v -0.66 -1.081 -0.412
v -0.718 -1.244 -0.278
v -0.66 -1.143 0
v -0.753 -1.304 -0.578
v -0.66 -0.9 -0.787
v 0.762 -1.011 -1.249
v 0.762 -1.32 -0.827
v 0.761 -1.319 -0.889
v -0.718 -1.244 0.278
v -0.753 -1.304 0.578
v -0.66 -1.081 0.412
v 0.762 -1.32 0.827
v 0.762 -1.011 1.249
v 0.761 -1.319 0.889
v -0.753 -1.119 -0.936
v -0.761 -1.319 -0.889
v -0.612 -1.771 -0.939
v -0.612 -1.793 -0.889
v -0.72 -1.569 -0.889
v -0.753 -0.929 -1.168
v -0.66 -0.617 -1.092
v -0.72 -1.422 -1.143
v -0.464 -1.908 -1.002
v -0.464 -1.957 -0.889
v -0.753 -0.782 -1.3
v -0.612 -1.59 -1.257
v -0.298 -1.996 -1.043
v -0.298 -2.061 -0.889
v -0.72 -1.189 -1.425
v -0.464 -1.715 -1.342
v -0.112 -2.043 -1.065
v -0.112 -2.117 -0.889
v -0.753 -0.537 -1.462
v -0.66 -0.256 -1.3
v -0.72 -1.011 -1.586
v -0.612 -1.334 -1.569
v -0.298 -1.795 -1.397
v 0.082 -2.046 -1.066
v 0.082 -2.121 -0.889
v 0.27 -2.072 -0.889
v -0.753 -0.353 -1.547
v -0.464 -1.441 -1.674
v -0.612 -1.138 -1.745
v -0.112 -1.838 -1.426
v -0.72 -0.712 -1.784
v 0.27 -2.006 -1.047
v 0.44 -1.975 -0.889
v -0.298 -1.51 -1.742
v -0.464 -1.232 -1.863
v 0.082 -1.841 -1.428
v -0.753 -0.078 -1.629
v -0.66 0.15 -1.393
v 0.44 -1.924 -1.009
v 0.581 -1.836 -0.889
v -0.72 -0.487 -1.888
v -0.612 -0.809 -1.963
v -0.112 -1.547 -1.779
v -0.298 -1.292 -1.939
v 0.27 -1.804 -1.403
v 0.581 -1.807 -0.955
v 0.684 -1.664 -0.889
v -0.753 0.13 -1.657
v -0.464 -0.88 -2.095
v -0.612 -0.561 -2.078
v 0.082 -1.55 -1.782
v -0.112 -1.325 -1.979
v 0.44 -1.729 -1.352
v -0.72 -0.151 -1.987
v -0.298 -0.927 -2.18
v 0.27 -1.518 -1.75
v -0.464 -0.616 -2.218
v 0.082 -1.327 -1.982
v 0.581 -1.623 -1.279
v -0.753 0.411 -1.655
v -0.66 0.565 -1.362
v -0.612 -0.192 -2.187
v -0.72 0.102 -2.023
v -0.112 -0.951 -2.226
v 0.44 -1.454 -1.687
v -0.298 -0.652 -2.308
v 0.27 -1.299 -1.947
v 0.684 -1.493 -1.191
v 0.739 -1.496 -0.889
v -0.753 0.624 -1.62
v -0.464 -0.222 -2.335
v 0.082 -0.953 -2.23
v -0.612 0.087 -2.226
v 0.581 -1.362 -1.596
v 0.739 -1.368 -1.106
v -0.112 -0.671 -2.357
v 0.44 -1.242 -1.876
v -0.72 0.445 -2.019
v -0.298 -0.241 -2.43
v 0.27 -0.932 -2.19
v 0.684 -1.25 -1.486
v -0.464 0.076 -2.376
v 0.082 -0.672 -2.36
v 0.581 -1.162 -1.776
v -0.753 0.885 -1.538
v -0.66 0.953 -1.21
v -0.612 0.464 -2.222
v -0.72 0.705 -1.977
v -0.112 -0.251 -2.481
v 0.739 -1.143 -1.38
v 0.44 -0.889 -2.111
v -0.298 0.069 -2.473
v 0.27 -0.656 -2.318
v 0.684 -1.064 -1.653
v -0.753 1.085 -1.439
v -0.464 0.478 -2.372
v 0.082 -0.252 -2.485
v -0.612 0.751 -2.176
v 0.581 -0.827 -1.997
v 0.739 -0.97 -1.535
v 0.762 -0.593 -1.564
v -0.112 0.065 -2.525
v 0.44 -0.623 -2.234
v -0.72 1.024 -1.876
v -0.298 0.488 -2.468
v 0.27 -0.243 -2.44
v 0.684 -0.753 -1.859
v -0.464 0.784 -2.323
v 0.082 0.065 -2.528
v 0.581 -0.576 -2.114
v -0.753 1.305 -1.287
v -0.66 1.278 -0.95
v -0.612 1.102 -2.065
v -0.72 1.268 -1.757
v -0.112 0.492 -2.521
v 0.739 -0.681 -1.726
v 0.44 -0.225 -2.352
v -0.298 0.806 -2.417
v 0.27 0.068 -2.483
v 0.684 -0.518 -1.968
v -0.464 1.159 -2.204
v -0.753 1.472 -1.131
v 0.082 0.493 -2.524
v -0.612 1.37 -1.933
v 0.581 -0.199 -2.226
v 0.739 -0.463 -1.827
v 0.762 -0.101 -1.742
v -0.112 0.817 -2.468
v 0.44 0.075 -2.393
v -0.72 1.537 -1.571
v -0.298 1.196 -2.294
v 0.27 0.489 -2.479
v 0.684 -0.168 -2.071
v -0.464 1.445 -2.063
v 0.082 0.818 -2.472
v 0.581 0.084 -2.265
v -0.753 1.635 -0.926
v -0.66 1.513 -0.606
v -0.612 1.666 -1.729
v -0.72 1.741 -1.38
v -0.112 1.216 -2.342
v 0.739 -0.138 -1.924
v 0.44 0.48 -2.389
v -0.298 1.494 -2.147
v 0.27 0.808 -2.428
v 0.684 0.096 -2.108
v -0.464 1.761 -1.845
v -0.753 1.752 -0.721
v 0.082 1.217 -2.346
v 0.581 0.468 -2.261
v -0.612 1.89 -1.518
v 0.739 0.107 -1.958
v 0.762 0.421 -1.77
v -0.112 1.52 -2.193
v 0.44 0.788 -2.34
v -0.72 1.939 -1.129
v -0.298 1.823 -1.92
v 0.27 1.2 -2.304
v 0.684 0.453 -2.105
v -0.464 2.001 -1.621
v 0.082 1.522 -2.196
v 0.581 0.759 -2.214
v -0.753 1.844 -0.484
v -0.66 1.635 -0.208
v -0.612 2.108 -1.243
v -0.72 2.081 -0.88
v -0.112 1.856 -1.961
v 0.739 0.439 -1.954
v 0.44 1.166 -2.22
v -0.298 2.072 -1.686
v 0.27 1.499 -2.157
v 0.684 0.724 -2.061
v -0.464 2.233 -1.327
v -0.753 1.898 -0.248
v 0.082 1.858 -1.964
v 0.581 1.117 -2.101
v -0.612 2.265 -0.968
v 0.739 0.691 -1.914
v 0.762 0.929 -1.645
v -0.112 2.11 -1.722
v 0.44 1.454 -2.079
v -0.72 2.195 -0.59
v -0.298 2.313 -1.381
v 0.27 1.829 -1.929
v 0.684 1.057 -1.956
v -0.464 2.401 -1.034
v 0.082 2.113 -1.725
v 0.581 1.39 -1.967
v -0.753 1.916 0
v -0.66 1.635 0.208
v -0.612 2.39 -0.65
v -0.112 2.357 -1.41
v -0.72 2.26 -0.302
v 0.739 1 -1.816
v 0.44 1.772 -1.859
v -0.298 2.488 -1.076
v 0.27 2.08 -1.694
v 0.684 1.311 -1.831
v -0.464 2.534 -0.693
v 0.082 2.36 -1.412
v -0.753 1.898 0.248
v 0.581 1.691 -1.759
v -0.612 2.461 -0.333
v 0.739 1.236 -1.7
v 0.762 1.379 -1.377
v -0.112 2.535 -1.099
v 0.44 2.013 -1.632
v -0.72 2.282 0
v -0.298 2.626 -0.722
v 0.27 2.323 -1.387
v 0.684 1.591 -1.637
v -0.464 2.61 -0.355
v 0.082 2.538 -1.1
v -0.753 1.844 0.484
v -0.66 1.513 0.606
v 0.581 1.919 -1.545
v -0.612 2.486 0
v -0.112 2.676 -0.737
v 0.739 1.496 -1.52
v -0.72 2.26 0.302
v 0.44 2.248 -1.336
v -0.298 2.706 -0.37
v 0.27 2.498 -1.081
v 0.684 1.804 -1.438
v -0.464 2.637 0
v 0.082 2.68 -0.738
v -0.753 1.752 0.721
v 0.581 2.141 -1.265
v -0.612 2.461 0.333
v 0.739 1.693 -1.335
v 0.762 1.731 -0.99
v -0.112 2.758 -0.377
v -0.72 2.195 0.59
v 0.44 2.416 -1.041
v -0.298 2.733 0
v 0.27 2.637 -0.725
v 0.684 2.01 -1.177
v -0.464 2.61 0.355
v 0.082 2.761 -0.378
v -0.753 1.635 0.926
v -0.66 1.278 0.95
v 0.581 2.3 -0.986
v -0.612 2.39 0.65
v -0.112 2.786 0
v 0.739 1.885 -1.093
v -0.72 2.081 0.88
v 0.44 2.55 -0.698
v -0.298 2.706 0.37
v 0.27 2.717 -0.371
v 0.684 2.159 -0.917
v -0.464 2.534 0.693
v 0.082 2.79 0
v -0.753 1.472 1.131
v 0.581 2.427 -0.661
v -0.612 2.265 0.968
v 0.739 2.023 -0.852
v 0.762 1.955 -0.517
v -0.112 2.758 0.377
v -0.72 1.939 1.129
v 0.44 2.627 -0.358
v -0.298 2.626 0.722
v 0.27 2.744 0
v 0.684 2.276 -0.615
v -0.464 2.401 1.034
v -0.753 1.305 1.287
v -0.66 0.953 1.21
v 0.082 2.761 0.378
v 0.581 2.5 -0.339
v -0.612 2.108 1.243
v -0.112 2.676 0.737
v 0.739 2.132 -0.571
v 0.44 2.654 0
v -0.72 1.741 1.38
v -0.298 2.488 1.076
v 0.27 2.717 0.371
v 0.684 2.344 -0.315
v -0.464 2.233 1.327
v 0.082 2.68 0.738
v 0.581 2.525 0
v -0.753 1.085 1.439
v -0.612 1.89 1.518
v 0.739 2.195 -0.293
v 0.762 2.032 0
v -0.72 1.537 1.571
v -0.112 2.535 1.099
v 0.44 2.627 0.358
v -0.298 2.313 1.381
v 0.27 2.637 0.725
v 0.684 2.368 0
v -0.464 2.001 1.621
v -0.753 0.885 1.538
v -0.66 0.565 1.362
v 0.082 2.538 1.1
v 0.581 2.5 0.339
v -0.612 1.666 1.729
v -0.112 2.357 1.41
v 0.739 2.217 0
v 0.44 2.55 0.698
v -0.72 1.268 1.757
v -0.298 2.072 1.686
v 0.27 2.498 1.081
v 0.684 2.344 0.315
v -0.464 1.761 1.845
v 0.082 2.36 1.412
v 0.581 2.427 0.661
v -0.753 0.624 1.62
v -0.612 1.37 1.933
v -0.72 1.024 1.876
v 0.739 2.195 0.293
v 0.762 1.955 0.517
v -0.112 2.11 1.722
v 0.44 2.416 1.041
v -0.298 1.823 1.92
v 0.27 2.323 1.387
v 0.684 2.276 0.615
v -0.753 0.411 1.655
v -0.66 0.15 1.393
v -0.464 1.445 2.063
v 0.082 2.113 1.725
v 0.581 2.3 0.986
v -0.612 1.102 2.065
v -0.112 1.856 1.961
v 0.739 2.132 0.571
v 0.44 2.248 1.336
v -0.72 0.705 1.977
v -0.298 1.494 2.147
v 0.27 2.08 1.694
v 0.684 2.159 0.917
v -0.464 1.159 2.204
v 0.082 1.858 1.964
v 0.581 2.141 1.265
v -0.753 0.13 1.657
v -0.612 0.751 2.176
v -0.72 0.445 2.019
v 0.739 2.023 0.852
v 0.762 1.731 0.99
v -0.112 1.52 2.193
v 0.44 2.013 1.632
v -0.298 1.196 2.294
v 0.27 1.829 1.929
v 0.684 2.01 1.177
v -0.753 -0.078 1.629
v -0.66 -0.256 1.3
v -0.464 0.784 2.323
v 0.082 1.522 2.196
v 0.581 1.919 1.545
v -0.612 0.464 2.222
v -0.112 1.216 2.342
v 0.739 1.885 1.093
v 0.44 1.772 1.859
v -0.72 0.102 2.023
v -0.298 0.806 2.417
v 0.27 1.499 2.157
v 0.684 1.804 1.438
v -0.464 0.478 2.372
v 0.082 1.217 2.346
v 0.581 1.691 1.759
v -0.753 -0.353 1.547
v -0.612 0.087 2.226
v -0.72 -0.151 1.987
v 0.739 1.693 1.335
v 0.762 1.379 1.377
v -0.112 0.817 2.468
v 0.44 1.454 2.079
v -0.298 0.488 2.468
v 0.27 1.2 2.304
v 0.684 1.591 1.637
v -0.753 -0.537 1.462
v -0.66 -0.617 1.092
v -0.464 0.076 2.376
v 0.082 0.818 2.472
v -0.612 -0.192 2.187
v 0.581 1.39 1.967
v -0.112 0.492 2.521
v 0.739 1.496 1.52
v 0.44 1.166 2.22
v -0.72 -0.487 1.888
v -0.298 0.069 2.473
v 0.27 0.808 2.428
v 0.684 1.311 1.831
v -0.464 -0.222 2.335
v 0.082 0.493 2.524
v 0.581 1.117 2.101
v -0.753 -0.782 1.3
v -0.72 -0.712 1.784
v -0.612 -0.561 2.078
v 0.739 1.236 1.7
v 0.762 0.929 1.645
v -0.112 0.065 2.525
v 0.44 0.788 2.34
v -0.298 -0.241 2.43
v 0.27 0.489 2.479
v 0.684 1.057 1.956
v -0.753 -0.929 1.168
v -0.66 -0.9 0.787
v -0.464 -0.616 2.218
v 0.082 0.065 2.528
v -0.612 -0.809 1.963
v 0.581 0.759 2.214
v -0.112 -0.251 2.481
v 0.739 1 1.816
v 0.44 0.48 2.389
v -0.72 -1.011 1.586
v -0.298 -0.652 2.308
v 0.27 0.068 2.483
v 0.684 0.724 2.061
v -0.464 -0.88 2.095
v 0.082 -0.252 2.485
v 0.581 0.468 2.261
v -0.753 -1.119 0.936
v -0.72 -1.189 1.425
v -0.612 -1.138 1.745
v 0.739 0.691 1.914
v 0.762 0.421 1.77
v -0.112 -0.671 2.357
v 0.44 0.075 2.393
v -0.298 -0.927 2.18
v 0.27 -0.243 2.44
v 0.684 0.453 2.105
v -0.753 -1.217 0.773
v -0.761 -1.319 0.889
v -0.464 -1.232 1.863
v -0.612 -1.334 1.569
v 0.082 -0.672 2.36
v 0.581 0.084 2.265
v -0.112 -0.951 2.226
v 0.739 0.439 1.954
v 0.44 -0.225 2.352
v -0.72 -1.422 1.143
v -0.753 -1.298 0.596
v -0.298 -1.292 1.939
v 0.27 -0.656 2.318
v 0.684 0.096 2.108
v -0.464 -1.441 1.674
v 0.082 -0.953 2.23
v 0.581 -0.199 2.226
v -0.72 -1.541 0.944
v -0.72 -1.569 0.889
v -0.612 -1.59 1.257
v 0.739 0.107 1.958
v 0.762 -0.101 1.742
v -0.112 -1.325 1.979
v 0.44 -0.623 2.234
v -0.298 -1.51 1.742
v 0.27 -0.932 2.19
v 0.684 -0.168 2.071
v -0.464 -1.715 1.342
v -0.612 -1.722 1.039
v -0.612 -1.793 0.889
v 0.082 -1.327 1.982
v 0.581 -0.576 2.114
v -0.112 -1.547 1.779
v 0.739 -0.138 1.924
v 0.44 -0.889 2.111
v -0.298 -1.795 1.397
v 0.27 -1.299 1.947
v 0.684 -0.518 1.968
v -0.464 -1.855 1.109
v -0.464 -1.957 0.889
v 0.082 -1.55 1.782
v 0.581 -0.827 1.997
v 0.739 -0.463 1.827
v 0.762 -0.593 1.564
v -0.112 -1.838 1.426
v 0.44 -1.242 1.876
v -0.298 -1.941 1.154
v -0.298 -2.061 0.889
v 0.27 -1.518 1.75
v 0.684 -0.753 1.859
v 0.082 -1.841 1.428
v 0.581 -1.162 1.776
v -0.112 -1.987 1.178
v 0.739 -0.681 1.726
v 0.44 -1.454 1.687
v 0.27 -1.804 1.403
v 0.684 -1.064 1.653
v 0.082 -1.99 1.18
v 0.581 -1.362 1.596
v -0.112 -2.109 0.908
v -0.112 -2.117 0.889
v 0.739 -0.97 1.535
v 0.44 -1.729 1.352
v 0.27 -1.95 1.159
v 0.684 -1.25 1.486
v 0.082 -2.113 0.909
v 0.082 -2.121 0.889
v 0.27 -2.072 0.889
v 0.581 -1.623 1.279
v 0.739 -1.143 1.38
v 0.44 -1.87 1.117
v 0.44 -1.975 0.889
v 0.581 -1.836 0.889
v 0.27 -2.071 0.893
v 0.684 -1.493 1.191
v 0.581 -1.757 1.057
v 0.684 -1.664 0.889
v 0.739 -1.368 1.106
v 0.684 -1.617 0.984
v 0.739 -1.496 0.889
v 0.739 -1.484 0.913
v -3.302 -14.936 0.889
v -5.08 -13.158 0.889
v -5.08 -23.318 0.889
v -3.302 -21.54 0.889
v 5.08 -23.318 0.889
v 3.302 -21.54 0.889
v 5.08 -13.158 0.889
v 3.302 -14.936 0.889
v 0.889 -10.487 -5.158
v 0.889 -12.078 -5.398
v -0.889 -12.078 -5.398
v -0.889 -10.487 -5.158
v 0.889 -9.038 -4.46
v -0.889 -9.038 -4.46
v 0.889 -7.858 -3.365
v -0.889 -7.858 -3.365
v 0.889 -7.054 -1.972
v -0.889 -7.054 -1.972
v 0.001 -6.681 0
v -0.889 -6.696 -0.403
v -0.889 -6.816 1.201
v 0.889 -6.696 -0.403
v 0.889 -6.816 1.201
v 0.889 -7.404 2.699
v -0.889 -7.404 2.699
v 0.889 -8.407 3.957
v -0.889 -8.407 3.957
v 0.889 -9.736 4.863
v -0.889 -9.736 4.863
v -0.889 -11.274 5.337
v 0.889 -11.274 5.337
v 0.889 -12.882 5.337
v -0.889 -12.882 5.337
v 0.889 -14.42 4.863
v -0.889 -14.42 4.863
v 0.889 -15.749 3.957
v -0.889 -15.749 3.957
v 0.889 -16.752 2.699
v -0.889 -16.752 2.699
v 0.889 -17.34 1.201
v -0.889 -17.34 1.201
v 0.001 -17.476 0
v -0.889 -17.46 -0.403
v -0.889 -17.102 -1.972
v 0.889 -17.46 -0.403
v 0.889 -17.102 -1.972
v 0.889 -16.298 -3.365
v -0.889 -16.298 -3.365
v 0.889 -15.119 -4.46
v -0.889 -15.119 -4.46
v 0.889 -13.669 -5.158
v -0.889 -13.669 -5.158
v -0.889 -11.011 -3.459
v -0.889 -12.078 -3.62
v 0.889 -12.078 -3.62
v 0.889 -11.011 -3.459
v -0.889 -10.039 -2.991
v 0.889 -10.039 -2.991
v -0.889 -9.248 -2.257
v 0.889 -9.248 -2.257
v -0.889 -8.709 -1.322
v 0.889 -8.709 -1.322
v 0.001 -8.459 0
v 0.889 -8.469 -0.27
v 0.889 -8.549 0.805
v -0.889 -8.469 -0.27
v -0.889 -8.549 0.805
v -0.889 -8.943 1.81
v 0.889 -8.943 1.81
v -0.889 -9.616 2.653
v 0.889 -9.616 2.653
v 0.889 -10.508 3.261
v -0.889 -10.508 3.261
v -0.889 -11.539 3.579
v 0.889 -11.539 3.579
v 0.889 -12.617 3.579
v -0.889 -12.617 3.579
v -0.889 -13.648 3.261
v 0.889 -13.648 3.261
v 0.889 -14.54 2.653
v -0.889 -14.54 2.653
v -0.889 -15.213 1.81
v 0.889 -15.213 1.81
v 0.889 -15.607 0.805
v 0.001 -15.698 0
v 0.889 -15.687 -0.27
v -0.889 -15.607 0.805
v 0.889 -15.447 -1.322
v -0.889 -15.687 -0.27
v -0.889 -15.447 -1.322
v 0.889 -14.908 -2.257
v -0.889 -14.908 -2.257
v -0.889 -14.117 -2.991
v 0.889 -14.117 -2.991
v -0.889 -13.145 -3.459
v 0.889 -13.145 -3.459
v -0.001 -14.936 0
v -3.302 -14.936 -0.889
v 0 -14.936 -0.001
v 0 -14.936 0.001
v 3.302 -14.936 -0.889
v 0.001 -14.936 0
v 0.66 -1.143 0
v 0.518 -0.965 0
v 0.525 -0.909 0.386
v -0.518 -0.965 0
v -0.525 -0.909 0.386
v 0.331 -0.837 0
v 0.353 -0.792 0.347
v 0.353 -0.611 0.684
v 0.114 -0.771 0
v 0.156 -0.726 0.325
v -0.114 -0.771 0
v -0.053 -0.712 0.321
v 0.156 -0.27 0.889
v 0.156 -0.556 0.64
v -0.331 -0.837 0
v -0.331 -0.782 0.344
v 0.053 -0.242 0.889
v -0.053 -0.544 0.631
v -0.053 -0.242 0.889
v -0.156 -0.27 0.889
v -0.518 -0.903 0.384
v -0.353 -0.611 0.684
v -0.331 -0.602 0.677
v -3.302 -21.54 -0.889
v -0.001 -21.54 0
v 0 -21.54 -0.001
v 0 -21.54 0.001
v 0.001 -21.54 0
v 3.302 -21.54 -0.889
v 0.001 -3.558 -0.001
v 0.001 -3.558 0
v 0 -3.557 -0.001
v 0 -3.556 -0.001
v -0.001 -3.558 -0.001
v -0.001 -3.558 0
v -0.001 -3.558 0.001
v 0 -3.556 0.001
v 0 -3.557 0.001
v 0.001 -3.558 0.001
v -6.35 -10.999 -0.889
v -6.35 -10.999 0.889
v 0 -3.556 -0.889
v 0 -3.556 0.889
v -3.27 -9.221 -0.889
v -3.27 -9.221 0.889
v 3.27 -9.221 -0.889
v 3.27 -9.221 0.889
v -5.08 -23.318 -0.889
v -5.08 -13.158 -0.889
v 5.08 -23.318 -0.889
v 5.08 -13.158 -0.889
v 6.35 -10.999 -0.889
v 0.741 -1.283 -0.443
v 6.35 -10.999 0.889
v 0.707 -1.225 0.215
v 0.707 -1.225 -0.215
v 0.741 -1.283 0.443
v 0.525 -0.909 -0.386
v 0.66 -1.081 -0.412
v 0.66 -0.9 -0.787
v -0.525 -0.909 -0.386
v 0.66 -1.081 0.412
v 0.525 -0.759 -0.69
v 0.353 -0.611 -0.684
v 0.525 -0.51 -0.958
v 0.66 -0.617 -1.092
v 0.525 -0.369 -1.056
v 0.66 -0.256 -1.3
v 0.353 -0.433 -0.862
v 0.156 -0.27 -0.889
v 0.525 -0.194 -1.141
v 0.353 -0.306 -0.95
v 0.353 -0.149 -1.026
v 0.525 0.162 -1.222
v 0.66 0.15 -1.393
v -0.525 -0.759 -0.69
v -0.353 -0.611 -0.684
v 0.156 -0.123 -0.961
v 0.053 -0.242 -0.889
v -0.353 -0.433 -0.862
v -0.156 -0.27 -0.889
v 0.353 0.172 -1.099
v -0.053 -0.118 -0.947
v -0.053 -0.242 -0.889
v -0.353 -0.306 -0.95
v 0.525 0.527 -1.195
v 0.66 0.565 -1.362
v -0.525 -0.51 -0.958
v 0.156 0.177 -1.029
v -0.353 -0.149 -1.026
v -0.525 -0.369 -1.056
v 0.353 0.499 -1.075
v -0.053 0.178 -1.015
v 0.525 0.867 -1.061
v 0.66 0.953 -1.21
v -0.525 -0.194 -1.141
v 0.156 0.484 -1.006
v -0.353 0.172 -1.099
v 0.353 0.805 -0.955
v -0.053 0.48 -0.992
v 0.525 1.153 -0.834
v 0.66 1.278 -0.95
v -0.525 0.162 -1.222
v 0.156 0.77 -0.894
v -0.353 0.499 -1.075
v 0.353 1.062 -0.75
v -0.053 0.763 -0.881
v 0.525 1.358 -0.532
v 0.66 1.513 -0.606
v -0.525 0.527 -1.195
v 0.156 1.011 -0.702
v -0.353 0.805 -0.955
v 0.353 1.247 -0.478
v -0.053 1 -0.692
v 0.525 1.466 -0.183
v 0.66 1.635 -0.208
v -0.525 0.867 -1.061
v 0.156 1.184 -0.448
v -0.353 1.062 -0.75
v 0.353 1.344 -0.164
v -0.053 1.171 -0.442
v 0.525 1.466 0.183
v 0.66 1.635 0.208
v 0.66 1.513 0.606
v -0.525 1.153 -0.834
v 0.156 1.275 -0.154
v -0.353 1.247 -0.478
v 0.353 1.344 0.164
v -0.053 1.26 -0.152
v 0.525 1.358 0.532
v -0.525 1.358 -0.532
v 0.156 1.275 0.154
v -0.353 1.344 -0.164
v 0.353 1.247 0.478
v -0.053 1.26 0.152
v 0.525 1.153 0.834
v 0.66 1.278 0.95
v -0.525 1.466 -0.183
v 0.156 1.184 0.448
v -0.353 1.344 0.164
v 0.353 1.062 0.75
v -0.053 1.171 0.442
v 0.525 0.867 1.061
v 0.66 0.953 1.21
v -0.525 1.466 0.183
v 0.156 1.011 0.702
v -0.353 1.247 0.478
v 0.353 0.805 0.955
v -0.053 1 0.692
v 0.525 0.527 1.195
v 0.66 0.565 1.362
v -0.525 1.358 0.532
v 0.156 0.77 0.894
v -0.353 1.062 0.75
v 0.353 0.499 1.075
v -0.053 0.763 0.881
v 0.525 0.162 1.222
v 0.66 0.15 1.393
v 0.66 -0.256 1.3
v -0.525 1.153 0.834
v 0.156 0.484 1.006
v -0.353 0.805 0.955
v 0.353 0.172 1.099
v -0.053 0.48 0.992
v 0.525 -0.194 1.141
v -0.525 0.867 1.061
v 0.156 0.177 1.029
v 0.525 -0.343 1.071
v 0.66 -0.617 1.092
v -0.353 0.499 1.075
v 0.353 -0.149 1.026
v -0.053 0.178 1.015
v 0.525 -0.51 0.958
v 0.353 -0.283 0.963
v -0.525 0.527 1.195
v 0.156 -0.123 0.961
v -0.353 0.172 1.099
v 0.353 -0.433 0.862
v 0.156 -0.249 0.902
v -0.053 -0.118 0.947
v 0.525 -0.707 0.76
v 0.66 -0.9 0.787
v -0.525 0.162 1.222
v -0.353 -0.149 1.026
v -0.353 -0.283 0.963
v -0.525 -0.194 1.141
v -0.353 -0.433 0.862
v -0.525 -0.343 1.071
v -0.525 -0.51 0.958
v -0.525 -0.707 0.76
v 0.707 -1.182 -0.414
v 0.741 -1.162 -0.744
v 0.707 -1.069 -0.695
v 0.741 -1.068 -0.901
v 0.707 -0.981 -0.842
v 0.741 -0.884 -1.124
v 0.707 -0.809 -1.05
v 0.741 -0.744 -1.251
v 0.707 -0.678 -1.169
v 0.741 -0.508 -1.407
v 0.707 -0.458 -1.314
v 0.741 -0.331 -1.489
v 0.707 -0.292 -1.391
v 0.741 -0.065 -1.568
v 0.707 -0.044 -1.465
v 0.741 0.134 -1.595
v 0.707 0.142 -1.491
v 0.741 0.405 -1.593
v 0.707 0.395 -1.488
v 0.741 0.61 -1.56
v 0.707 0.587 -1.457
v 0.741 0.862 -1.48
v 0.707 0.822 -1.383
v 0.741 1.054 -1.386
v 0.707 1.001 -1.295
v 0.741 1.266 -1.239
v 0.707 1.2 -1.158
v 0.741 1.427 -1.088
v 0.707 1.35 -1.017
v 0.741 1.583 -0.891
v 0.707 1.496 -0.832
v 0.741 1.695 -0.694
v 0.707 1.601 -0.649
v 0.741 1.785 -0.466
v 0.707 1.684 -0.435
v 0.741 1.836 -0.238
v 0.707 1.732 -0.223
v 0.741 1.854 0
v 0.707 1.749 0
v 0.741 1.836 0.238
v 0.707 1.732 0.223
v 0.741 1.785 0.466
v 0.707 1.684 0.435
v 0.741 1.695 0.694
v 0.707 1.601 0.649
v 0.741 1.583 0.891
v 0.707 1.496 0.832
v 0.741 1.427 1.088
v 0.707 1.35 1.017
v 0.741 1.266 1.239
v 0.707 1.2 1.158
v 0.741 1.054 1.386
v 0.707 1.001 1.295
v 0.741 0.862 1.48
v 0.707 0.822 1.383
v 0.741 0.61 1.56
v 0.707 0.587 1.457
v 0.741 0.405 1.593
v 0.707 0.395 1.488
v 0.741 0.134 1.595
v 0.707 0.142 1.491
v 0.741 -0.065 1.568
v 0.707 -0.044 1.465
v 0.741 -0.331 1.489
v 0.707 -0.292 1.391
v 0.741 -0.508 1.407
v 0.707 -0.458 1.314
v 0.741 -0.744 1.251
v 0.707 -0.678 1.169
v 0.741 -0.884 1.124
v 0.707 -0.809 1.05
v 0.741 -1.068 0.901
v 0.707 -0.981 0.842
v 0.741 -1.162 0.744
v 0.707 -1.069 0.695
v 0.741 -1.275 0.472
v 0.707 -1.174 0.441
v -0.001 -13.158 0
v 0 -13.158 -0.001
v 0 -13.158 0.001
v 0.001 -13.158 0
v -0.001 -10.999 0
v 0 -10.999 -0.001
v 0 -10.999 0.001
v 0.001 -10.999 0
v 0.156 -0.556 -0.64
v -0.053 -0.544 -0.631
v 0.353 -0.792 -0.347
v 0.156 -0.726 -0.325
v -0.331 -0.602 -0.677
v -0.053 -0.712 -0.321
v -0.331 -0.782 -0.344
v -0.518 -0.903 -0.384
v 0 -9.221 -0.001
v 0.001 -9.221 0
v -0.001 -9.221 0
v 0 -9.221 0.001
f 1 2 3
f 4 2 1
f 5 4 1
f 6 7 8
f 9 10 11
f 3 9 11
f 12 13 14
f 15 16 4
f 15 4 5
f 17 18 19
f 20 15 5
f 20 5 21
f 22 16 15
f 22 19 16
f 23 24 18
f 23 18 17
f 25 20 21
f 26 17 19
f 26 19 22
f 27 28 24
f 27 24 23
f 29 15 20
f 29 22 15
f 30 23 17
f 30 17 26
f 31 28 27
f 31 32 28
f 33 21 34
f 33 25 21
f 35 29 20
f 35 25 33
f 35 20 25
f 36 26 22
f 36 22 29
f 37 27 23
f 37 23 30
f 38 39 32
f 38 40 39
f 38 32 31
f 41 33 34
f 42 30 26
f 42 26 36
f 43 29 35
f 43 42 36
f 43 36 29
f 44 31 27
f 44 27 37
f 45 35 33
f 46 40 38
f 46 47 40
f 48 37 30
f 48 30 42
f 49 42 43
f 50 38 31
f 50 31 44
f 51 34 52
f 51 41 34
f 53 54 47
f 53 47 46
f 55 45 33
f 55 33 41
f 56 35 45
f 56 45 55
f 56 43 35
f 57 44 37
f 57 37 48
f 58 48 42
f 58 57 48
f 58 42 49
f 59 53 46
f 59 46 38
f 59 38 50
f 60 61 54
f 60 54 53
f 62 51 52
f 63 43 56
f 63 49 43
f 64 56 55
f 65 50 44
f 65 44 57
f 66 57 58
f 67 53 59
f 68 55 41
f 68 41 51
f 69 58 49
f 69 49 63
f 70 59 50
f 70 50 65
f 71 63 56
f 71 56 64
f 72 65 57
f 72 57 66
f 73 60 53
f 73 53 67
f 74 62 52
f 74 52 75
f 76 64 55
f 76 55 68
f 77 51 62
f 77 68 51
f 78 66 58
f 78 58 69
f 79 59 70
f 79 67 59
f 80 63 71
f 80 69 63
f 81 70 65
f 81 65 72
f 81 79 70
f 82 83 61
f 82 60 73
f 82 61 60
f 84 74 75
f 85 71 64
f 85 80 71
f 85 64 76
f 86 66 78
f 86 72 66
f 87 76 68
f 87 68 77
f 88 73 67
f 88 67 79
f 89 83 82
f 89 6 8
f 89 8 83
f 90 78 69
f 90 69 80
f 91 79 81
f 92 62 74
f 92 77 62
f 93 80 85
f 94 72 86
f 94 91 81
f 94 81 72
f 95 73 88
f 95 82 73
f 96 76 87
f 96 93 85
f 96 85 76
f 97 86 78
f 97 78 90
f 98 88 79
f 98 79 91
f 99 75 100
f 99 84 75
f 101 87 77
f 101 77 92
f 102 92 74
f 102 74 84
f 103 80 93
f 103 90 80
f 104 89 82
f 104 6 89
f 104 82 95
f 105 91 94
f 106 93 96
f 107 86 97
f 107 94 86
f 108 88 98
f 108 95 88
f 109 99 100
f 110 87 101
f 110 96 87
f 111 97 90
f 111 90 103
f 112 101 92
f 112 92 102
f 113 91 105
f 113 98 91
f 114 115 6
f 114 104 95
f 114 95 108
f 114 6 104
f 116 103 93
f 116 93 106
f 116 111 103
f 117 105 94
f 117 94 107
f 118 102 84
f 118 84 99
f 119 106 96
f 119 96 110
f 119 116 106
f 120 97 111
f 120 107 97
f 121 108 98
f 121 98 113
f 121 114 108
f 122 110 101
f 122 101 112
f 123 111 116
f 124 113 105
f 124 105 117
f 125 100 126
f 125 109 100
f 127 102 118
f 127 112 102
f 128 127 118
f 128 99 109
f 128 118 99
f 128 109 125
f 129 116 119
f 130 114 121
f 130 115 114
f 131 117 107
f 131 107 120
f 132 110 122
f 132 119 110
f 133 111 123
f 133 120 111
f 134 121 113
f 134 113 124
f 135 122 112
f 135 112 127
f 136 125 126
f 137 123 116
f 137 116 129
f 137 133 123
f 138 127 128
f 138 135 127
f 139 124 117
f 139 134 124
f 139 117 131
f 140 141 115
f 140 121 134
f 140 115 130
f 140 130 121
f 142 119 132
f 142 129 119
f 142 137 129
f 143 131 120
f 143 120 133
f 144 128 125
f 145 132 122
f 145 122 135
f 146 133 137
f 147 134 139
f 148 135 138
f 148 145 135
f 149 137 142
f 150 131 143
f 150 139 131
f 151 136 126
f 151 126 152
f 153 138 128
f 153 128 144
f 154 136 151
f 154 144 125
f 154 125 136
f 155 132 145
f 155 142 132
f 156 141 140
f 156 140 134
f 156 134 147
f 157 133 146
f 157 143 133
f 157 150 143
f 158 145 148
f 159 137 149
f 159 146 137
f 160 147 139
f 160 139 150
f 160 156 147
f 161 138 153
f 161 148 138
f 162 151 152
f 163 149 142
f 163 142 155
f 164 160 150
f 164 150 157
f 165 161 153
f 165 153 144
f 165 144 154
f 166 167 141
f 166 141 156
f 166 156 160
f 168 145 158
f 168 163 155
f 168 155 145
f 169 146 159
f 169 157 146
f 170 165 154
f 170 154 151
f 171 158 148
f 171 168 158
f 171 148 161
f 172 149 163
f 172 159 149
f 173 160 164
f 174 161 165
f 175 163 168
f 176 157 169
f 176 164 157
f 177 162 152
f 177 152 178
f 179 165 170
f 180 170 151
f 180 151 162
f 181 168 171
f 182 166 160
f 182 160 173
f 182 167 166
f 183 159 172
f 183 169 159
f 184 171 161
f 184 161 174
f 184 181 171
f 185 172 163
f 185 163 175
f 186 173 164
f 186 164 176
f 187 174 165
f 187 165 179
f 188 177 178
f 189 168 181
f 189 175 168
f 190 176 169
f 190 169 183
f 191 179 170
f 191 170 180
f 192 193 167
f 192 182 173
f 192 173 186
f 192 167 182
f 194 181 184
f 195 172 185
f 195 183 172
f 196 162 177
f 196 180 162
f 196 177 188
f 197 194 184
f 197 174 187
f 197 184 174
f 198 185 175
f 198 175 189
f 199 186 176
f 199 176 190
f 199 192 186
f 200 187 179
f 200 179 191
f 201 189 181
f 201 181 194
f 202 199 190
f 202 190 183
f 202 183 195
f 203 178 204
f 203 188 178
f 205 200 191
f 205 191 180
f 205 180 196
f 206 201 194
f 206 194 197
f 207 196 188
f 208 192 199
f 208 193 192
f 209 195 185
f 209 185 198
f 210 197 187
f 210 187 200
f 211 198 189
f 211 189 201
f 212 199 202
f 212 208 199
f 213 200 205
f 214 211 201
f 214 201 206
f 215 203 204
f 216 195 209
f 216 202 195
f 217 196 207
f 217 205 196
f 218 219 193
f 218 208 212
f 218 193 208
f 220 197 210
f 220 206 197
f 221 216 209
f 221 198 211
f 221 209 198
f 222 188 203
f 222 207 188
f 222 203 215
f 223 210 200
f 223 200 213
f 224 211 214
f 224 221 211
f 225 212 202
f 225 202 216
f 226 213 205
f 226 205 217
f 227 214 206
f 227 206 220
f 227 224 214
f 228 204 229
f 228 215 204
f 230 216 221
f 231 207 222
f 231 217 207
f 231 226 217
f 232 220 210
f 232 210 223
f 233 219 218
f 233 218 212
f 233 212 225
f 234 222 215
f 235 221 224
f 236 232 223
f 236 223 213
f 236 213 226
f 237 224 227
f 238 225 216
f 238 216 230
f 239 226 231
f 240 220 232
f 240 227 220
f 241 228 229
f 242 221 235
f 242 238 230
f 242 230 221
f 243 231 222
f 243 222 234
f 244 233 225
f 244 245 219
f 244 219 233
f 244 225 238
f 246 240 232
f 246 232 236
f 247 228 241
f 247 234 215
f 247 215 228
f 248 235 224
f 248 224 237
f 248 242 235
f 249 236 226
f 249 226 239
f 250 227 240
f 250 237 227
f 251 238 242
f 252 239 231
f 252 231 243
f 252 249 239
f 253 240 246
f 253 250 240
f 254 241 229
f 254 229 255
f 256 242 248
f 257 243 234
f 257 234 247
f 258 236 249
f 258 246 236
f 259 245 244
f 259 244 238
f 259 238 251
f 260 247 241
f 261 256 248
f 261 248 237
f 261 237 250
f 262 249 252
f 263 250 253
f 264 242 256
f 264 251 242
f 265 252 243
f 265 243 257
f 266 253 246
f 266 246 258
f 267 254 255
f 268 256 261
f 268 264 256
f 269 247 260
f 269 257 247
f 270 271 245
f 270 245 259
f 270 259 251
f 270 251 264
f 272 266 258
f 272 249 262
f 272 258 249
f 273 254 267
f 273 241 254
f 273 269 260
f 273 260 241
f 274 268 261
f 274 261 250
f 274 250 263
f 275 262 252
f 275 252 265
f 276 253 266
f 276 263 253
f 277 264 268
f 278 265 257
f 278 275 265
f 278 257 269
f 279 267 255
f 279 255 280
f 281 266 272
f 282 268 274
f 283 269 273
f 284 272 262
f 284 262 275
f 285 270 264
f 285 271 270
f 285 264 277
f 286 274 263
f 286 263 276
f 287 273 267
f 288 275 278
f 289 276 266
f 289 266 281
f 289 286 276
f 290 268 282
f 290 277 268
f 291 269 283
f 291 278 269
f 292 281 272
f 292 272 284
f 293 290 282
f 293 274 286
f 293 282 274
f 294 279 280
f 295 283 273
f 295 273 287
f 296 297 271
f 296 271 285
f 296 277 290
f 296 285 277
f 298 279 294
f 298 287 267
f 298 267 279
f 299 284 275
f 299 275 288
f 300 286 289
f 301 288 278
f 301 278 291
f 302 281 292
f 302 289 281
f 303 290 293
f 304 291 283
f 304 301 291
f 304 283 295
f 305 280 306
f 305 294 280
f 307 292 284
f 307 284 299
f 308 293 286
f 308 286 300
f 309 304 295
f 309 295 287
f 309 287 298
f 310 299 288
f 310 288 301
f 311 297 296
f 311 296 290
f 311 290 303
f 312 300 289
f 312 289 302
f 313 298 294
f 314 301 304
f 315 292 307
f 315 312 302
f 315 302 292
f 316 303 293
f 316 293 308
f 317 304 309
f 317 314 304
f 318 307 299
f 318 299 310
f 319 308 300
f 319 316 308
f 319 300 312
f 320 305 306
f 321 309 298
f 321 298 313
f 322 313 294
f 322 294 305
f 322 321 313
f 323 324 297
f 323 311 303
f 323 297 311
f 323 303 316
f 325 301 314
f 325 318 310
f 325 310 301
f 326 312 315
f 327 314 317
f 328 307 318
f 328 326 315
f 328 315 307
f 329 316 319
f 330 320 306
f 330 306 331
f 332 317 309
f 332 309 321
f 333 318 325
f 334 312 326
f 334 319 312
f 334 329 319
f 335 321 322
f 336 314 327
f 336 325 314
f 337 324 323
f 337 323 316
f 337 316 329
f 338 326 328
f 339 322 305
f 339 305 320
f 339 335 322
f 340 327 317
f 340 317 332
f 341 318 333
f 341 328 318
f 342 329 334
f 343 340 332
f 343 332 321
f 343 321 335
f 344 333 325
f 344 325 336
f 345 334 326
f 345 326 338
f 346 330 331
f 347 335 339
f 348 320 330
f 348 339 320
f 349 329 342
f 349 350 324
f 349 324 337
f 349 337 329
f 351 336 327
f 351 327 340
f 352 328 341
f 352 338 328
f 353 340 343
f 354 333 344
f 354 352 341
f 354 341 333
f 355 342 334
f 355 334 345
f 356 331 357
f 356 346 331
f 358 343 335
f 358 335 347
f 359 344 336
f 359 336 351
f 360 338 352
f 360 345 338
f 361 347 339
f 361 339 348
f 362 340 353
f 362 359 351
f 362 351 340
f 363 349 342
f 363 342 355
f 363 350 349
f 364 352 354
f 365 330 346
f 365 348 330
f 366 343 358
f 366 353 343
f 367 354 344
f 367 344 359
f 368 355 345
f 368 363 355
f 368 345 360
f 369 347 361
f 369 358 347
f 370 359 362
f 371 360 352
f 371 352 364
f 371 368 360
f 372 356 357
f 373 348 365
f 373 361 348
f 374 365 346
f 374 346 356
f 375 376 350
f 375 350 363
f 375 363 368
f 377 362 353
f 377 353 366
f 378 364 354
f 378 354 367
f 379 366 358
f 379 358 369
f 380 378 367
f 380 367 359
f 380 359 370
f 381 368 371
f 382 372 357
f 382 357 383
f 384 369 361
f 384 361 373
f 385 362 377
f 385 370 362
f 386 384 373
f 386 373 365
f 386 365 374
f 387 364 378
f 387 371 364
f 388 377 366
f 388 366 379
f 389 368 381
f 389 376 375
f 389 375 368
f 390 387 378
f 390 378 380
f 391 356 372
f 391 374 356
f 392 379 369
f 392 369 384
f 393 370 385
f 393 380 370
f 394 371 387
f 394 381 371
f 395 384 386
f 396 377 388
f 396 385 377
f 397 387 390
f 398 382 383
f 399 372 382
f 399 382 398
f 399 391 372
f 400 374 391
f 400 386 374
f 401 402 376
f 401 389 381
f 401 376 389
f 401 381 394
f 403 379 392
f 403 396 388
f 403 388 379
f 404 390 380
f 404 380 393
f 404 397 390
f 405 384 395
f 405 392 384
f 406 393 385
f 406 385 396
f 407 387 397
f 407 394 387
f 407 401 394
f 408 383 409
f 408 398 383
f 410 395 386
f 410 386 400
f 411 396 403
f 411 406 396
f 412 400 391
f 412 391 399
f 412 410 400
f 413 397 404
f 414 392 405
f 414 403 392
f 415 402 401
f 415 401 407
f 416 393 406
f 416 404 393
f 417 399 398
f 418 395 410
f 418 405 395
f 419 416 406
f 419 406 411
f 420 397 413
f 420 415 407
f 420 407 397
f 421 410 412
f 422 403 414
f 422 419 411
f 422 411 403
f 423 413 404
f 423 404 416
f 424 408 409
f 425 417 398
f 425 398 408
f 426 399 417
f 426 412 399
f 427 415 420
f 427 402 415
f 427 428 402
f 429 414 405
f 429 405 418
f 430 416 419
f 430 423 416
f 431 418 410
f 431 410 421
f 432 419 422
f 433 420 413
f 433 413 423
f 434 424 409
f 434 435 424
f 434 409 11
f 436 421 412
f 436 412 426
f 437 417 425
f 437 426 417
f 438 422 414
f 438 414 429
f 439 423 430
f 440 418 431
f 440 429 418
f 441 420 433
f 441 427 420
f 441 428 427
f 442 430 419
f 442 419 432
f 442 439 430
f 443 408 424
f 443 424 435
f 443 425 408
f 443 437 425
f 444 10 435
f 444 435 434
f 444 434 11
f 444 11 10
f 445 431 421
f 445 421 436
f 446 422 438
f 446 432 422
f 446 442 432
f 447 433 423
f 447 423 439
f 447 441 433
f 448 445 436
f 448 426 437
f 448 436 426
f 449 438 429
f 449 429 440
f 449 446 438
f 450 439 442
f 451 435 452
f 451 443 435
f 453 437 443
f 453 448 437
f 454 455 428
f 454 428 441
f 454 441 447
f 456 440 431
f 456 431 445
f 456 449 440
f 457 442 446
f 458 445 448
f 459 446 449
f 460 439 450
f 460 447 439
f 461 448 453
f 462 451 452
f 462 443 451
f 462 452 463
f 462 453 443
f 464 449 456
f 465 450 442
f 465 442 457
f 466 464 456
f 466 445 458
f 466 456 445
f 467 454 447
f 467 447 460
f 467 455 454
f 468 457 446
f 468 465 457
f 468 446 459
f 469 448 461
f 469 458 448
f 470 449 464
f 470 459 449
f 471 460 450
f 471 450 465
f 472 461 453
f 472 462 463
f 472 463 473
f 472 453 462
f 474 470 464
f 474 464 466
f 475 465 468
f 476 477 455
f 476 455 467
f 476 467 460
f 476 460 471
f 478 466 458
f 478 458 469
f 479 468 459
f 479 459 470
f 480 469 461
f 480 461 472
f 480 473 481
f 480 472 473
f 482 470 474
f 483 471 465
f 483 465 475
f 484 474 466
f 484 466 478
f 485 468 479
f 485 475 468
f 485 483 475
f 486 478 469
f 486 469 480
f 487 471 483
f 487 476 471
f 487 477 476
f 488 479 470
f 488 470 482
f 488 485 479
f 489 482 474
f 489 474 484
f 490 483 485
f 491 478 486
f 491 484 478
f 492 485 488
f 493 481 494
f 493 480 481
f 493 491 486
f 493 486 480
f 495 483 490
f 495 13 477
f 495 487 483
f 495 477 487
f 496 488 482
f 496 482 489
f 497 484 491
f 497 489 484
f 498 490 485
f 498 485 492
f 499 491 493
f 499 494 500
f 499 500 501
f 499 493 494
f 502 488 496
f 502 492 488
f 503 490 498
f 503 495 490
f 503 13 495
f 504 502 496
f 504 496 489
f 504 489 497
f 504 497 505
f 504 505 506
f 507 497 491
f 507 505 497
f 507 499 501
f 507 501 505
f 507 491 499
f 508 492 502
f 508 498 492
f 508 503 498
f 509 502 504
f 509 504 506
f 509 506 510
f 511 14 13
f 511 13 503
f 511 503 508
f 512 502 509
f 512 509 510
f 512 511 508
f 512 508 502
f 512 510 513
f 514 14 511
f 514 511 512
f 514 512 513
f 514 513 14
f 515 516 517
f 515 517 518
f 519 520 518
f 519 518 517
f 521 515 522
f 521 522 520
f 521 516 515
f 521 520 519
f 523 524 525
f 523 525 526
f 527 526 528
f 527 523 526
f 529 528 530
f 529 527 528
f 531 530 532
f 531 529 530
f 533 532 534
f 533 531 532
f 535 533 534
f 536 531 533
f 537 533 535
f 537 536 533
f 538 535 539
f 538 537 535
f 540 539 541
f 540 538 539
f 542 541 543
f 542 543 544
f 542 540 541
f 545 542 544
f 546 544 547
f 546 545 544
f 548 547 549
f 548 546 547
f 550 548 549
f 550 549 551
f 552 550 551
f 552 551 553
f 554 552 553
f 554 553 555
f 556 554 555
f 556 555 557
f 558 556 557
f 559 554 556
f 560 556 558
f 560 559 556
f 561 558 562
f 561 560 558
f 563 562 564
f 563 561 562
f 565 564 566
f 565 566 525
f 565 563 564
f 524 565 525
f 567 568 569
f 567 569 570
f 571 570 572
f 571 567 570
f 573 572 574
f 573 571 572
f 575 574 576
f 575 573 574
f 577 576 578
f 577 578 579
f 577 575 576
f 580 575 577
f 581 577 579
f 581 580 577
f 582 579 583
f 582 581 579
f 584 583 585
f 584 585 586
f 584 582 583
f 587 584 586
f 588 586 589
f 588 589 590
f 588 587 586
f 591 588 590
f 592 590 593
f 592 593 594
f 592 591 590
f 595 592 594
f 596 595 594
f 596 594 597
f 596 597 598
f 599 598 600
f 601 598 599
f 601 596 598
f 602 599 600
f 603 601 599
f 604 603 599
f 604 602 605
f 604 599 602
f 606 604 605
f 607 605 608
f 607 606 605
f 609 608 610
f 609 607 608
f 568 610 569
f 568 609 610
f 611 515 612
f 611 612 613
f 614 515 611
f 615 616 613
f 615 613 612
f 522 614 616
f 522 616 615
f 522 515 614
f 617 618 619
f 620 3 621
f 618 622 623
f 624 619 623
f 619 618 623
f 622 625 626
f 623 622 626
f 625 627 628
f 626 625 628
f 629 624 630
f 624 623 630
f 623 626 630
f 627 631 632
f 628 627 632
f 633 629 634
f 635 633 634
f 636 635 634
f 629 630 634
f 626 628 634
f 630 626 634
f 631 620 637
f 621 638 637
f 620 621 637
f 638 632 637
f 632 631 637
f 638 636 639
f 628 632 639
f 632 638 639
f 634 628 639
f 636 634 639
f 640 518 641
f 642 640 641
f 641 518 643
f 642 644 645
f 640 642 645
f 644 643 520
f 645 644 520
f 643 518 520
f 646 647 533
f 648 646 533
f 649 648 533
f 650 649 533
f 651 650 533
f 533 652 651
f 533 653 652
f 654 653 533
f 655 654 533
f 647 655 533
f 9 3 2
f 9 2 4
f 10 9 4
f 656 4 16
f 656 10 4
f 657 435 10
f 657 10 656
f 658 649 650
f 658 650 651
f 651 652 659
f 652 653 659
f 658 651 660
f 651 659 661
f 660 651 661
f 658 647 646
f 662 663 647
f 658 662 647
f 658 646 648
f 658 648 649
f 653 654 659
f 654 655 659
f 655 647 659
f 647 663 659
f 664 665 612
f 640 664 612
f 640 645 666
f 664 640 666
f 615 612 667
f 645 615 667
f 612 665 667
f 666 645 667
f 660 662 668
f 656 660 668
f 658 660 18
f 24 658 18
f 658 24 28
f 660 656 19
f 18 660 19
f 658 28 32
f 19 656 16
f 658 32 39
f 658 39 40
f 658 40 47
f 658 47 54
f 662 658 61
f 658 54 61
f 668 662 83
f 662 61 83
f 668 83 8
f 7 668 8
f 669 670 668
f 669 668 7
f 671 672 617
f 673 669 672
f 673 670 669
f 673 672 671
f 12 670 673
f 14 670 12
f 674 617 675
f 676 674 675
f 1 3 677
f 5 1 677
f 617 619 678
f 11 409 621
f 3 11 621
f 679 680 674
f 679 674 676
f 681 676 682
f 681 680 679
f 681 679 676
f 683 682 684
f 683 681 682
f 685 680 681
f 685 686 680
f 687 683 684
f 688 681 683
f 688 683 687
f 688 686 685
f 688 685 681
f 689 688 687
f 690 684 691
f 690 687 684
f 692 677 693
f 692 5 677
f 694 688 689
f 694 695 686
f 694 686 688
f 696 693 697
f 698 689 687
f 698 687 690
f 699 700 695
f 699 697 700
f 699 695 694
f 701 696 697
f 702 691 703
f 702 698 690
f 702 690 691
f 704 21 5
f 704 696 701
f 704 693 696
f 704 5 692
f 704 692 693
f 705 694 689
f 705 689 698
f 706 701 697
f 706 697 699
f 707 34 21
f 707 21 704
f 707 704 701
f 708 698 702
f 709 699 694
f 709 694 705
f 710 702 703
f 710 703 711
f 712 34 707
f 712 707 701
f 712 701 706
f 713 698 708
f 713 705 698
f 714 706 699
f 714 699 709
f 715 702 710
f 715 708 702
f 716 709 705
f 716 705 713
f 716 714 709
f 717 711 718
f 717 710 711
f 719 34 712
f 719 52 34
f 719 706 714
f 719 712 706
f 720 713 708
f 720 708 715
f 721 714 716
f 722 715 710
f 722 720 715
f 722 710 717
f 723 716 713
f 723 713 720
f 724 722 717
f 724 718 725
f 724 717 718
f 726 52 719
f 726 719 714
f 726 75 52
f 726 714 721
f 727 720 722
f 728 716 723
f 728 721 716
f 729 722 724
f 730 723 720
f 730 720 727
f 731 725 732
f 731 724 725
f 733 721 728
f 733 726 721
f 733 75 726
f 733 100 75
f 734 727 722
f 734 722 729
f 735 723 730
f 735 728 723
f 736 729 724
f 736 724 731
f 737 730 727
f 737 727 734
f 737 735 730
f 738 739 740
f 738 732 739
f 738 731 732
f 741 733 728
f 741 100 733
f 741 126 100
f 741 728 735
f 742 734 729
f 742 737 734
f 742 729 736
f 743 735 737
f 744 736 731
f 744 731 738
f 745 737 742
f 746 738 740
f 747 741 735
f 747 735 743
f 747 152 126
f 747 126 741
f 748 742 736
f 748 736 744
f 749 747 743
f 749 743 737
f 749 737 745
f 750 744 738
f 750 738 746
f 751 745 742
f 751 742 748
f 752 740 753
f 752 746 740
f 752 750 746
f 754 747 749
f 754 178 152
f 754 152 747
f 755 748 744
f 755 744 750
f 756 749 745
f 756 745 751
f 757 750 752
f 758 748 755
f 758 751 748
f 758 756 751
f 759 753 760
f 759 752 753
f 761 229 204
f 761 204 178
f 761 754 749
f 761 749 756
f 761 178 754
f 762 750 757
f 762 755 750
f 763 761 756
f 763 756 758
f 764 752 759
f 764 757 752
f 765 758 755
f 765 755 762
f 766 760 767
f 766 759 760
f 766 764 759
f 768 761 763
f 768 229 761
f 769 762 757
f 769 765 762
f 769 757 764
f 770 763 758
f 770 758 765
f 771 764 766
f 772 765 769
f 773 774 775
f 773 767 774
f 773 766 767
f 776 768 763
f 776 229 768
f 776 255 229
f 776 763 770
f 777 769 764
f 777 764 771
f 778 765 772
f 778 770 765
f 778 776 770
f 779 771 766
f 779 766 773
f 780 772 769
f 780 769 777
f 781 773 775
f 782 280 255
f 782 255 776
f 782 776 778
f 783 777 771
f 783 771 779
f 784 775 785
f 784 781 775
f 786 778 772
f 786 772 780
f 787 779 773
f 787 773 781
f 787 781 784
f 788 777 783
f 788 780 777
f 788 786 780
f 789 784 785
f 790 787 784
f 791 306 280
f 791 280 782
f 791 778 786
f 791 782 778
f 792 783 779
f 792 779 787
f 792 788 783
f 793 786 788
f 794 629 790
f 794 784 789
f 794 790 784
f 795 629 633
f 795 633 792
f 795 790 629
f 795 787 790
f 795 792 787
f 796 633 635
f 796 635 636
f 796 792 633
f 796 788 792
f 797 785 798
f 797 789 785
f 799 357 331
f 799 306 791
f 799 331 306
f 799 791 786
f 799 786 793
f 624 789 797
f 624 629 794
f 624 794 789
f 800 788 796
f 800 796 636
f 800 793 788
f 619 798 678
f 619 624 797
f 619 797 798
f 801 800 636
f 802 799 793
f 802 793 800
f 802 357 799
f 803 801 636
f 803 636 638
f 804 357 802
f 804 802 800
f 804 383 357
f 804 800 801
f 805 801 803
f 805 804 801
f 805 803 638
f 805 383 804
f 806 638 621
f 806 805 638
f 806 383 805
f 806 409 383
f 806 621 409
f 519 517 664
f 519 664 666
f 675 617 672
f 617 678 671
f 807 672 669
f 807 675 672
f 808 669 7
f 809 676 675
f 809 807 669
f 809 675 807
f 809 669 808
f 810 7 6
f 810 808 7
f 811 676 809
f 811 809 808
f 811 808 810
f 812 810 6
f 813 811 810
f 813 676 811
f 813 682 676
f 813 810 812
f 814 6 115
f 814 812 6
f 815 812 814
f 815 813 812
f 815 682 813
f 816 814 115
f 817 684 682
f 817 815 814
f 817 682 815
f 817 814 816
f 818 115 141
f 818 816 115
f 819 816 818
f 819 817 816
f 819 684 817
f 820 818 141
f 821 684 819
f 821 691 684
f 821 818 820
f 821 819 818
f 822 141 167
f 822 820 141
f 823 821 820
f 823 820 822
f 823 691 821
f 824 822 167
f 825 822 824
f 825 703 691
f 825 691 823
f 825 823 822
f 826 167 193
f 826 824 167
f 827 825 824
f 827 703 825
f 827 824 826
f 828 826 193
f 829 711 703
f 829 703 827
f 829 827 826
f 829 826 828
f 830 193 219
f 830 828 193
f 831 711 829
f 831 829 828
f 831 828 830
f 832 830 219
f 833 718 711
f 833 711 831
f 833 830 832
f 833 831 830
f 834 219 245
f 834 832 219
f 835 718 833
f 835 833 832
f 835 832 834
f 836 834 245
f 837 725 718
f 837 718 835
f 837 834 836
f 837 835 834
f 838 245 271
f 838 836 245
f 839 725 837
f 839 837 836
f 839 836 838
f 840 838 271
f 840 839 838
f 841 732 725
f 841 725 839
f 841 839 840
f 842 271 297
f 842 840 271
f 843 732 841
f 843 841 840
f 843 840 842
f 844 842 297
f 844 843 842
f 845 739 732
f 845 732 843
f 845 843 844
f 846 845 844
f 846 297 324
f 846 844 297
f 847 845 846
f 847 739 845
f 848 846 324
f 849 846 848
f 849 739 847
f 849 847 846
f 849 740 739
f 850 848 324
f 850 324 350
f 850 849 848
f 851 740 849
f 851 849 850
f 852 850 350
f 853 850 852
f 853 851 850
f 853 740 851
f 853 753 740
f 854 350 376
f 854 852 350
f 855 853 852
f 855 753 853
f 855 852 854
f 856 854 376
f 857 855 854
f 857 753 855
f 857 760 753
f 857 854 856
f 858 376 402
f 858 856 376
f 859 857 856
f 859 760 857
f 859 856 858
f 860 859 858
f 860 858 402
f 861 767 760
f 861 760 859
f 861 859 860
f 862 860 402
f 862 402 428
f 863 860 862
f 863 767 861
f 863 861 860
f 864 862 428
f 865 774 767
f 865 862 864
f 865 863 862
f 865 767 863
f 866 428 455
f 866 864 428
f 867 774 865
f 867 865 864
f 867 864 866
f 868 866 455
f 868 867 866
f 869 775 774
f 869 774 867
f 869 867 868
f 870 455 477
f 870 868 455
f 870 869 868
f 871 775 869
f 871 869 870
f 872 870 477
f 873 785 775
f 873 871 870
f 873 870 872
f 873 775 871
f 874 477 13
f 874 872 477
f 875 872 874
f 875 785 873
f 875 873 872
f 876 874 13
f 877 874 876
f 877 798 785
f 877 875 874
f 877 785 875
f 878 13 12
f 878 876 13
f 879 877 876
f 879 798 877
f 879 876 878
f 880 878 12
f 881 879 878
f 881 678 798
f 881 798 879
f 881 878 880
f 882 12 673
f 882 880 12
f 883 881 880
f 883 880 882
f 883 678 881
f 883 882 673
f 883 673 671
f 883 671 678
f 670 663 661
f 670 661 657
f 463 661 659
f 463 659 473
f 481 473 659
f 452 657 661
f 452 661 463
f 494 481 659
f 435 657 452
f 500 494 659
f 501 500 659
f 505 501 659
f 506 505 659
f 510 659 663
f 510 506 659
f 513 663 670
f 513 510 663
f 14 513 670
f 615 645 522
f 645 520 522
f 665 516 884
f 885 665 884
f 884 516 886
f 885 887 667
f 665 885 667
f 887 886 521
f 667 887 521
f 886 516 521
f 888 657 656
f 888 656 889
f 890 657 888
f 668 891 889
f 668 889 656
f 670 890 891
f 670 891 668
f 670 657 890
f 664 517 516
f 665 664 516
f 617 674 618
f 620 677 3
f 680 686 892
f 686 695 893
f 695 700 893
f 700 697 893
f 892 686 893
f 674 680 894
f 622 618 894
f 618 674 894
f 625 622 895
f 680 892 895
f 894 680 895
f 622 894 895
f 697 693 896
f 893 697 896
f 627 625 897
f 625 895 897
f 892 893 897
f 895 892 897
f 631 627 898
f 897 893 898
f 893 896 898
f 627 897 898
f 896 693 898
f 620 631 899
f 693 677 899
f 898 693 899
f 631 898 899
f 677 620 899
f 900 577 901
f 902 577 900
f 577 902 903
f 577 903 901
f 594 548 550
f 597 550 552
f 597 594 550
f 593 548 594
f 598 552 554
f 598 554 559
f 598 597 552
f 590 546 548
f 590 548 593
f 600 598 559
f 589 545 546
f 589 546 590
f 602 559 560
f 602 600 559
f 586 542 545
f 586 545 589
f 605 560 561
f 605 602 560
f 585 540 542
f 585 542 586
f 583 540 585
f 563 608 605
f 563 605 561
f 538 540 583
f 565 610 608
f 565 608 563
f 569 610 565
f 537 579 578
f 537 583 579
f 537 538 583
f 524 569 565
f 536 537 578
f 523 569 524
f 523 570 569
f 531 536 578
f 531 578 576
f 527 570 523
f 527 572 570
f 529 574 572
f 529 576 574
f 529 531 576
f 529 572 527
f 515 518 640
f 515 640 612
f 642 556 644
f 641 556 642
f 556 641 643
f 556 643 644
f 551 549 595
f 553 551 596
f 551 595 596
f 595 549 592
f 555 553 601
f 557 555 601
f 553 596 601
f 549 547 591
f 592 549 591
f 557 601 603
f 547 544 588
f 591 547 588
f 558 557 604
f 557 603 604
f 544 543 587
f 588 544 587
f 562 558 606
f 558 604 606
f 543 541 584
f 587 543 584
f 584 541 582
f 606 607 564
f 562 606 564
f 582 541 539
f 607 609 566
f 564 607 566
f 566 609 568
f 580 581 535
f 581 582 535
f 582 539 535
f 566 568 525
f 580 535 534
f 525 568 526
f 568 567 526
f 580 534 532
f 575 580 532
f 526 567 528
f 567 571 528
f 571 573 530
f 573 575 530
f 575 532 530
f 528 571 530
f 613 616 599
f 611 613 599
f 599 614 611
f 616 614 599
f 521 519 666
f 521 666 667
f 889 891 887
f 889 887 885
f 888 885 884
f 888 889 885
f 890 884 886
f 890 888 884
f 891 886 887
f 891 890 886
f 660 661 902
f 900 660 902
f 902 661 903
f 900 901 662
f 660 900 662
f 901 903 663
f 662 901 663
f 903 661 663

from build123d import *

# Parameters (mm, degrees)
BOSS_EXTRUDE1_DEPTH = 0.889
SKETCH2_R           = 5.3975
SKETCH2_R_2         = 3.6195
BOSS_EXTRUDE2_DEPTH = 0.889
SKETCH3_W           = 10.16
SKETCH3_H           = 10.16
SKETCH3_W_2         = 6.604
SKETCH3_H_2         = 6.604
BOSS_EXTRUDE3_DEPTH = 0.889
SKETCH4_R           = 0.762
BOSS_EXTRUDE4_START = -2.54
SKETCH8_R           = 0.00127
BOSS_EXTRUDE4_DEPTH = 18.999523


with BuildPart() as part:
    # Sketch1 → Boss-Extrude1 (new body, symmetric)
    with BuildSketch(Plane.XY):
        Polygon((0, 0), (-6.35, -10.998522628), (6.35, -10.998522628), align=None)
        Polygon((0, -3.556), (-3.270413664, -9.220522628), (3.270413664, -9.220522628), align=None, mode=Mode.SUBTRACT)
    extrude(amount=BOSS_EXTRUDE1_DEPTH, both=True)

    # Sketch4 → Revolve1 (revolve)
    with BuildSketch(Plane.XY):
        with Locations((0, -1.524)):
            Circle(SKETCH4_R)
    revolve(axis=Axis((0, 0.254, 0), (1, 0, 0)))

    # Sketch5 → Cut-Revolve1 (revolve, cut)
    with BuildSketch(Plane.XY):
        with BuildLine():
            Line((-0.659911358, -1.143), (-0.659911358, 0.254))
            Line((-0.659911358, 0.254), (0.659911358, 0.254))
            Line((0.659911358, 0.254), (0.659911358, -1.143))
            ThreePointArc((0.659911358, -1.143), (0, -0.762), (-0.659911358, -1.143))
        make_face()
    revolve(axis=Axis((0.659911358, 0.254, 0), (-1, 0, 0)), mode=Mode.SUBTRACT)



with BuildPart() as body_2:
    # Sketch2 → Boss-Extrude2 (new body, symmetric)
    with BuildSketch(Plane(origin=(0, 0, 0), x_dir=(0, 0, -1), z_dir=(1, 0, 0))):
        with Locations((0, -12.078022628)):
            Circle(SKETCH2_R)
        with Locations((0, -12.078022628)):
            Circle(SKETCH2_R_2, mode=Mode.SUBTRACT)
    extrude(amount=BOSS_EXTRUDE2_DEPTH, both=True)


with BuildPart() as body_3:
    # Sketch3 → Boss-Extrude3 (new body, symmetric)
    with BuildSketch(Plane.XY):
        with Locations((0, -18.237522628)):
            Rectangle(SKETCH3_W, SKETCH3_H)
        with Locations((0, -18.237522628)):
            Rectangle(SKETCH3_W_2, SKETCH3_H_2, mode=Mode.SUBTRACT)
    extrude(amount=BOSS_EXTRUDE3_DEPTH, both=True)


with BuildPart() as part_1:
    add(part.part)

    add(body_2.part)  # Boss-Extrude4 merges body 2

    add(body_3.part)  # Boss-Extrude4 merges body 3
    # Sketch8 → Boss-Extrude4 (add)
    with BuildSketch(Plane(origin=(0, 0, 0), x_dir=(1, 0, 0), z_dir=(0, 1, 0)).offset(BOSS_EXTRUDE4_START)):
        Circle(SKETCH8_R)
    extrude(amount=-BOSS_EXTRUDE4_DEPTH)


solid = part_1.part
